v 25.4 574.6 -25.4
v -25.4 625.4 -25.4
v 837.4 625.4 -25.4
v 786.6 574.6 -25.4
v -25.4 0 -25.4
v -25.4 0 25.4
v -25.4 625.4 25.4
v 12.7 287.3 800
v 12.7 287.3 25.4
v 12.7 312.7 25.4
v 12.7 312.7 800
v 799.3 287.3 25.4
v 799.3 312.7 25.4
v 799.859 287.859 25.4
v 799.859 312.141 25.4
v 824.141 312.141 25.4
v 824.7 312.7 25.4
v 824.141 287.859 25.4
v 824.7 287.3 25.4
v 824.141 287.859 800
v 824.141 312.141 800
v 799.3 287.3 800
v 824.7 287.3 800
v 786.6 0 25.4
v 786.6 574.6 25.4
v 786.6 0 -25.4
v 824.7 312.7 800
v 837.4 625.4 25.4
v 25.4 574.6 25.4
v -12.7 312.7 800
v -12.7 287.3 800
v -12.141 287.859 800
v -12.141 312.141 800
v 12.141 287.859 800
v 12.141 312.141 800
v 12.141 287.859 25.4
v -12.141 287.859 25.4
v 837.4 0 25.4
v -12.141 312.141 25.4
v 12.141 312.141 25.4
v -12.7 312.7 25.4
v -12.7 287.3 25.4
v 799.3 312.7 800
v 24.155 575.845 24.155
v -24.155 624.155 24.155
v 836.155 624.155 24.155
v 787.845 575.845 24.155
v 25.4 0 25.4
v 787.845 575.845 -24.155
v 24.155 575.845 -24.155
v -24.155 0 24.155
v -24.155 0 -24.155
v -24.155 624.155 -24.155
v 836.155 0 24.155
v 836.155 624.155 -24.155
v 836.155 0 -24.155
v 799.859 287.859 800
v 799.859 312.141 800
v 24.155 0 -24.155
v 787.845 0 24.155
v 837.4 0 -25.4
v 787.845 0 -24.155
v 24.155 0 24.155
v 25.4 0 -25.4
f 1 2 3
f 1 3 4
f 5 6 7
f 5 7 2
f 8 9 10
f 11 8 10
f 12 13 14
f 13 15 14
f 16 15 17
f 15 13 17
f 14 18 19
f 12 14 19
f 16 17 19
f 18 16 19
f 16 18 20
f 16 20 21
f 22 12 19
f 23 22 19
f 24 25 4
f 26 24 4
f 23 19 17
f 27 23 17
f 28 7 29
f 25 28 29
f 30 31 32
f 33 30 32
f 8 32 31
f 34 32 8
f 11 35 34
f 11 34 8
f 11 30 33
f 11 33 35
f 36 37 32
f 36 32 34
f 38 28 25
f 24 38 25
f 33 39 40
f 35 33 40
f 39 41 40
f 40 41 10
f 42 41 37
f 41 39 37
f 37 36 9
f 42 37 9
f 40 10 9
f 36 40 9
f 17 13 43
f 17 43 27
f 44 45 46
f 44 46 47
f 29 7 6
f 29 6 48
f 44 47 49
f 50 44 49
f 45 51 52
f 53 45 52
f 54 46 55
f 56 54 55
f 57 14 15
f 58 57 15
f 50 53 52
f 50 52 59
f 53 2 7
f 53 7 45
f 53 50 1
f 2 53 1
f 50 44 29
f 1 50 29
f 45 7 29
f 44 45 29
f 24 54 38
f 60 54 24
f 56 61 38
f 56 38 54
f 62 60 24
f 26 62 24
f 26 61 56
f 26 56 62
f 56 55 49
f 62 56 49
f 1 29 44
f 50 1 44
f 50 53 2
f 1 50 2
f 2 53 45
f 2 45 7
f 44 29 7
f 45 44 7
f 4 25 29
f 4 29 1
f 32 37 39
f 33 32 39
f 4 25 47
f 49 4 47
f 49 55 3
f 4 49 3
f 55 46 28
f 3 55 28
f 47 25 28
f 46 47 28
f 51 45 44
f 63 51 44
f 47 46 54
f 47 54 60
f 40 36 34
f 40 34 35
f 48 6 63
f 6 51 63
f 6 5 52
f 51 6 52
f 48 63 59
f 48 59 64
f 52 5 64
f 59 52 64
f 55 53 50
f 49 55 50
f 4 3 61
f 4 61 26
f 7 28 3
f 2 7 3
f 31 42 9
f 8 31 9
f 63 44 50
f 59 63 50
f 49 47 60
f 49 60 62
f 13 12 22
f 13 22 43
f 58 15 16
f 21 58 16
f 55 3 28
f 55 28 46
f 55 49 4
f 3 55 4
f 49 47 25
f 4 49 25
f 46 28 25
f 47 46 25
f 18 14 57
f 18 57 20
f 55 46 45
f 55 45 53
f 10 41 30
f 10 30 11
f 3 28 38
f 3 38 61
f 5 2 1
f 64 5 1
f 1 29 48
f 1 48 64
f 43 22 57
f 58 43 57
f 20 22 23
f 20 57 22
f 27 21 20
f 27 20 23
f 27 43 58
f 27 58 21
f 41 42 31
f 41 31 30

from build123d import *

# Parameters (mm, degrees)
SKETCH11_W                               = 50.8
SKETCH11_H                               = 50.8
SKETCH11_W_2                             = 48.3108
SKETCH11_H_2                             = 48.3108
AL_TUBE_SQUARE_2_SQ_X_049_WALL_3_DEPTH   = 636.921024484
SKETCH11_ON_SEGMENT_2_W                  = 50.8
SKETCH11_ON_SEGMENT_2_H                  = 50.8
SKETCH11_ON_SEGMENT_2_W_2                = 48.3108
SKETCH11_ON_SEGMENT_2_H_2                = 48.3108
AL_TUBE_SQUARE_2_SQ_X_049_WALL_3_2_DEPTH = 885.842048969
SKETCH11_ON_SEGMENT_3_W                  = 50.8
SKETCH11_ON_SEGMENT_3_H                  = 50.8
SKETCH11_ON_SEGMENT_3_W_2                = 48.3108
SKETCH11_ON_SEGMENT_3_H_2                = 48.3108
AL_TUBE_SQUARE_2_SQ_X_049_WALL_3_4_DEPTH = 636.921024484
SKETCH1_W                                = 25.4
SKETCH1_H                                = 25.4
SKETCH1_W_2                              = 24.2824
SKETCH1_H_2                              = 24.2824
AL_TUBE_SQUARE_1_SQ_X_022_WALL_7_DEPTH   = 800
SKETCH1_ON_SEGMENT_2_W                   = 25.4
SKETCH1_ON_SEGMENT_2_H                   = 25.4
SKETCH1_ON_SEGMENT_2_W_2                 = 24.2824
SKETCH1_ON_SEGMENT_2_H_2                 = 24.2824
AL_TUBE_SQUARE_1_SQ_X_022_WALL_7_2_DEPTH = 800


with BuildPart() as part:
    # Sketch11 → Al tube (square) 2 SQ X .049 WALL(3) (new body)
    with BuildSketch(Plane(origin=(0, 0, 0), x_dir=(1, 0, 0), z_dir=(0, 1, 0))):
        Rectangle(SKETCH11_W, SKETCH11_H)
        Rectangle(SKETCH11_W_2, SKETCH11_H_2, mode=Mode.SUBTRACT)
    extrude(amount=AL_TUBE_SQUARE_2_SQ_X_049_WALL_3_DEPTH)

    # Al tube (square) 2 SQ X .049 WALL(3) mitr
    split(bisect_by=Plane(origin=(0, 600, 0), x_dir=(0.707106781, -0.707106781, 0), z_dir=(-0.707106781, -0.707106781, 0)), keep=Keep.TOP)


with BuildPart() as body_2:
    # Sketch11 on segment 2 (carried to segment 2) → Al tube _square_ 2 SQ X .049 WALL_3 2 (new body)
    with BuildSketch(Plane(origin=(-36.921024484, 600, 0), x_dir=(0, -1, 0), z_dir=(1, 0, 0))):
        Rectangle(SKETCH11_ON_SEGMENT_2_W, SKETCH11_ON_SEGMENT_2_H)
        Rectangle(SKETCH11_ON_SEGMENT_2_W_2, SKETCH11_ON_SEGMENT_2_H_2, mode=Mode.SUBTRACT)
    extrude(amount=AL_TUBE_SQUARE_2_SQ_X_049_WALL_3_2_DEPTH)

    # Al tube _square_ 2 SQ X .049 WALL_3 2 mi
    split(bisect_by=Plane(origin=(0, 600, 0), x_dir=(-0.707106781, 0.707106781, 0), z_dir=(0.707106781, 0.707106781, 0)), keep=Keep.TOP)

    # Al tube (square) 2 SQ X .049 WALL(3)  3
    split(bisect_by=Plane(origin=(812, 600, 0), x_dir=(-0.707106781, -0.707106781, 0), z_dir=(-0.707106781, 0.707106781, 0)), keep=Keep.TOP)


with BuildPart() as body_3:
    # Sketch11 on segment 3 (carried to segment 3) → Al tube (square) 2 SQ X .049 WALL(3)  4 (new body)
    with BuildSketch(Plane(origin=(812, 636.921024484, 0), x_dir=(-1, 0, 0), z_dir=(0, -1, 0))):
        Rectangle(SKETCH11_ON_SEGMENT_3_W, SKETCH11_ON_SEGMENT_3_H)
        Rectangle(SKETCH11_ON_SEGMENT_3_W_2, SKETCH11_ON_SEGMENT_3_H_2, mode=Mode.SUBTRACT)
    extrude(amount=AL_TUBE_SQUARE_2_SQ_X_049_WALL_3_4_DEPTH)

    # Al tube _square_ 2 SQ X .049 WALL_3 4 mi
    split(bisect_by=Plane(origin=(812, 600, 0), x_dir=(0.707106781, 0.707106781, 0), z_dir=(0.707106781, -0.707106781, 0)), keep=Keep.TOP)


with BuildPart() as body_4:
    # Sketch1 → Al tube (square) 1 SQ X .022 WALL(7) (new body)
    with BuildSketch(Plane(origin=(0, 300, 0), x_dir=(1, 0, 0), z_dir=(0, 0, 1))):
        Rectangle(SKETCH1_W, SKETCH1_H)
        Rectangle(SKETCH1_W_2, SKETCH1_H_2, mode=Mode.SUBTRACT)
    extrude(amount=AL_TUBE_SQUARE_1_SQ_X_022_WALL_7_DEPTH)

    # Recortar/Extender1
    split(bisect_by=Plane(origin=(812.358422222, 300.179211111, 25.4), x_dir=(0, -1, 0), z_dir=(0, 0, 1)), keep=Keep.TOP)


with BuildPart() as body_5:
    # Sketch1 on segment 2 (carried to segment 2) → Al tube _square_ 1 SQ X .022 WALL_7 2 (new body)
    with BuildSketch(Plane(origin=(812, 300, 0), x_dir=(1, 0, 0), z_dir=(0, 0, 1))):
        Rectangle(SKETCH1_ON_SEGMENT_2_W, SKETCH1_ON_SEGMENT_2_H)
        Rectangle(SKETCH1_ON_SEGMENT_2_W_2, SKETCH1_ON_SEGMENT_2_H_2, mode=Mode.SUBTRACT)
    extrude(amount=AL_TUBE_SQUARE_1_SQ_X_022_WALL_7_2_DEPTH)

    # Recortar/Extender1
    split(bisect_by=Plane(origin=(812.358422222, 300.179211111, 25.4), x_dir=(0, -1, 0), z_dir=(0, 0, 1)), keep=Keep.TOP)


solid = Compound([part.part, body_2.part, body_3.part, body_4.part, body_5.part])
